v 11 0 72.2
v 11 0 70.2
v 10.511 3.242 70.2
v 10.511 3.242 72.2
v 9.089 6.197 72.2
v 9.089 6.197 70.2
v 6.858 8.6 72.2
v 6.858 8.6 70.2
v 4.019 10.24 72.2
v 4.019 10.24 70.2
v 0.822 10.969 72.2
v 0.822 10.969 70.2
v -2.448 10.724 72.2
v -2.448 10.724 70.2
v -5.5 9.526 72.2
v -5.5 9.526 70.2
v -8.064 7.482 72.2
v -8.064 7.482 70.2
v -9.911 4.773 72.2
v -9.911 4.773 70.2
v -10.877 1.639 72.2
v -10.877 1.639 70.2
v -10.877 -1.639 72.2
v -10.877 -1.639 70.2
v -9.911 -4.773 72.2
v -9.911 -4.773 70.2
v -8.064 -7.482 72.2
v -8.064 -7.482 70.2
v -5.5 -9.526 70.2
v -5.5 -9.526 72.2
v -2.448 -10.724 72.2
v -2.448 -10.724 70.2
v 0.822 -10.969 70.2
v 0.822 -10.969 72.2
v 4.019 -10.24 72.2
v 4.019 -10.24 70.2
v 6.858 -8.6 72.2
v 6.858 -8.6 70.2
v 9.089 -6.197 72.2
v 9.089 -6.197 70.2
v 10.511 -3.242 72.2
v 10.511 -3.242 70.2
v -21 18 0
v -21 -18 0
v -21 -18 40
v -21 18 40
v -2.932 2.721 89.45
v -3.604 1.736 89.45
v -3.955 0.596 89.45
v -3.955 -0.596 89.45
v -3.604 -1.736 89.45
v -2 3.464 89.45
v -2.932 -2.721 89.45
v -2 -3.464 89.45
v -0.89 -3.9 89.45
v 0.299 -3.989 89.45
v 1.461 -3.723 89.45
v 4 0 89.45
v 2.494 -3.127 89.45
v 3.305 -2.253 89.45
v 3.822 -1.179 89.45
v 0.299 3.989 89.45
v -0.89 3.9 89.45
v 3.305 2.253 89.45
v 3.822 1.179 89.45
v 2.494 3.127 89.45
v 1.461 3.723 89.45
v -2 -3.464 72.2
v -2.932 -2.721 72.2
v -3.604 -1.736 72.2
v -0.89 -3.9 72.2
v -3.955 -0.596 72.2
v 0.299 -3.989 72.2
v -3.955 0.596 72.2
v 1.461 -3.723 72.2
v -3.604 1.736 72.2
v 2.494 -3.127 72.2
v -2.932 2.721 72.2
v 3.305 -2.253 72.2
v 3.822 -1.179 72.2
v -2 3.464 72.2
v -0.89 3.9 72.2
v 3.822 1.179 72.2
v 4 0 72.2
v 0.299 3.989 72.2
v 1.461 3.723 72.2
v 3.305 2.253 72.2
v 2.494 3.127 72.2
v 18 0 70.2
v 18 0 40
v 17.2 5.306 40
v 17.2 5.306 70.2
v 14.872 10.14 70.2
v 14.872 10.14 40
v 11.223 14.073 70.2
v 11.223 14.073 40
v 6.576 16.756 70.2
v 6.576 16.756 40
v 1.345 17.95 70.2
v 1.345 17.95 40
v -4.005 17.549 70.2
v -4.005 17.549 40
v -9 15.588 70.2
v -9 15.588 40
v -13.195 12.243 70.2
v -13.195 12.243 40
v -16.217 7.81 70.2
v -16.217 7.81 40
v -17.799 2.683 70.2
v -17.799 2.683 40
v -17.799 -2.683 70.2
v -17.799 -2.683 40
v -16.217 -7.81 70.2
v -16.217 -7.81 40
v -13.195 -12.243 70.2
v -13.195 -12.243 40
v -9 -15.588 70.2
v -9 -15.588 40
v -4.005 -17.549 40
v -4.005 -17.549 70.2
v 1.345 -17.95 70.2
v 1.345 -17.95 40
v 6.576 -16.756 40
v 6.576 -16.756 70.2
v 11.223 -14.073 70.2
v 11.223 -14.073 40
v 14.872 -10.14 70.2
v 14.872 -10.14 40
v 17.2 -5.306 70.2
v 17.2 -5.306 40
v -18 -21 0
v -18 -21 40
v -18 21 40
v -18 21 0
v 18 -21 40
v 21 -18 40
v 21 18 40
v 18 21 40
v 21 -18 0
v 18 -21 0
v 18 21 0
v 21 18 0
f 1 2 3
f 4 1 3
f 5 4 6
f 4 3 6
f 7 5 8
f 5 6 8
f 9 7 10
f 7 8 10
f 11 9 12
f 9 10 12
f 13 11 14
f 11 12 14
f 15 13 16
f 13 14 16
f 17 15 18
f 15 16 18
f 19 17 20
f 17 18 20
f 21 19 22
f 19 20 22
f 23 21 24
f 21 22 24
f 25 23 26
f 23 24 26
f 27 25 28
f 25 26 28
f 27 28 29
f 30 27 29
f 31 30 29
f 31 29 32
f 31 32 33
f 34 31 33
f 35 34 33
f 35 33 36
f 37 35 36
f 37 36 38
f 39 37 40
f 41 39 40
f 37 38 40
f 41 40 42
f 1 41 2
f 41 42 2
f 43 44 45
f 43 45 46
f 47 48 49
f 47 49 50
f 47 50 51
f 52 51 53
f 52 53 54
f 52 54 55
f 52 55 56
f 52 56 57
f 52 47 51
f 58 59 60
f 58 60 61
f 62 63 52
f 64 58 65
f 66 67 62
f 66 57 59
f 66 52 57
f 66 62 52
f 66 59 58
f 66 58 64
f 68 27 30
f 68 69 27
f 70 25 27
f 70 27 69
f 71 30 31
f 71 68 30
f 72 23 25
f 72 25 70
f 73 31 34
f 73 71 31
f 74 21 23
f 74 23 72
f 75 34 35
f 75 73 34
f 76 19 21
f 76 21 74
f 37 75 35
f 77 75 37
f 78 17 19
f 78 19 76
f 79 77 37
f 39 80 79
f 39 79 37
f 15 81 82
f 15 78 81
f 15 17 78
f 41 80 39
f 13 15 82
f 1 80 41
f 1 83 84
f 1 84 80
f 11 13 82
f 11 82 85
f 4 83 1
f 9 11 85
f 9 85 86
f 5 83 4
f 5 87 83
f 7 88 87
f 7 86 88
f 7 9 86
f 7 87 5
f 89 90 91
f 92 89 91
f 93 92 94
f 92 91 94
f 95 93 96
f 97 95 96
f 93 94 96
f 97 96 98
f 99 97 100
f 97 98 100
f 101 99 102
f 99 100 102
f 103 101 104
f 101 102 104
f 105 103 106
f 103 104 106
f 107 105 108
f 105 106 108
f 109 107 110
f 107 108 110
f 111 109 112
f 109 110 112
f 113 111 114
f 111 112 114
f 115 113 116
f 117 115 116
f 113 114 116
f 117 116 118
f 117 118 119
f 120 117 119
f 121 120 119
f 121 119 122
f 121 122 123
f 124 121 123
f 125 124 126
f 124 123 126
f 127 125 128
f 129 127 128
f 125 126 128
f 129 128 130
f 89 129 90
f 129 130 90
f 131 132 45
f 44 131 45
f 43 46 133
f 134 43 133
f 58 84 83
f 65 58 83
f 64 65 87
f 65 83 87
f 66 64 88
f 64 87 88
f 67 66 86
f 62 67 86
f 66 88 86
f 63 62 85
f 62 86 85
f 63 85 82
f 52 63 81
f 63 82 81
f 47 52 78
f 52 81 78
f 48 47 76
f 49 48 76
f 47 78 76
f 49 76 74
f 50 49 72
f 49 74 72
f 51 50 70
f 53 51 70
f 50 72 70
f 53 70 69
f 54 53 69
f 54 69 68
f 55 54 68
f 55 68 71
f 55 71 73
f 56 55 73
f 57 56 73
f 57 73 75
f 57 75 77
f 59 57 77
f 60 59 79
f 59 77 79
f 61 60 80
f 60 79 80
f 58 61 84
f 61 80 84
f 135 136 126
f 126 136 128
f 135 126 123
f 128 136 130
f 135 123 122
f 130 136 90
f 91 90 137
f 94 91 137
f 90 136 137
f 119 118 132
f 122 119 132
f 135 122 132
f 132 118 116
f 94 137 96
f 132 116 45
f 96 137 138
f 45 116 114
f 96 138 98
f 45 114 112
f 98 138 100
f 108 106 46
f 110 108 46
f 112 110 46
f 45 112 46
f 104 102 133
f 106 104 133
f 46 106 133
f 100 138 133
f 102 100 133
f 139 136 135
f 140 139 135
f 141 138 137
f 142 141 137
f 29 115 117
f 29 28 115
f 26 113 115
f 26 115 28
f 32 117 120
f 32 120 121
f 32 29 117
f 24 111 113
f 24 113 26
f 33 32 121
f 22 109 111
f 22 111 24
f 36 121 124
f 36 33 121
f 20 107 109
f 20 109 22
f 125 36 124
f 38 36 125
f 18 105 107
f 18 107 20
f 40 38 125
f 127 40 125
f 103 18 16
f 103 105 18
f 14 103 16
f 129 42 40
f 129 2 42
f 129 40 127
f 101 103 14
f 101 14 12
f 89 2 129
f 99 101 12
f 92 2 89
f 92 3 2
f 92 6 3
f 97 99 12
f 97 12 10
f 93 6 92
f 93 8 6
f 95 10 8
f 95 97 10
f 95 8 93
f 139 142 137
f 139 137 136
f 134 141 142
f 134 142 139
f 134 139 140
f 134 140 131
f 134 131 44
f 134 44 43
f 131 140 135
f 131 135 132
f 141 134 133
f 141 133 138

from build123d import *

# Parameters (mm, degrees)
BOSS_EXTRUDE1_DEPTH = 40
SKETCH2_R           = 18
BOSS_EXTRUDE2_DEPTH = 30.2
SKETCH3_R           = 11
BOSS_EXTRUDE3_DEPTH = 2
SKETCH4_R           = 4
BOSS_EXTRUDE4_DEPTH = 17.25


with BuildPart() as part:
    # Sketch1 → Boss-Extrude1 (new body)
    with BuildSketch(Plane.XY):
        Polygon((-21, 18), (-18, 21), (18, 21), (21, 18), (21, -18), (18, -21), (-18, -21), (-21, -18), align=None)
    extrude(amount=BOSS_EXTRUDE1_DEPTH)

    # Sketch2 → Boss-Extrude2 (add)
    with BuildSketch(Plane.XY.offset(40)):
        Circle(SKETCH2_R)
    extrude(amount=BOSS_EXTRUDE2_DEPTH)

    # Sketch3 → Boss-Extrude3 (add)
    with BuildSketch(Plane.XY.offset(70.2)):
        Circle(SKETCH3_R)
    extrude(amount=BOSS_EXTRUDE3_DEPTH)

    # Sketch4 → Boss-Extrude4 (add)
    with BuildSketch(Plane.XY.offset(72.2)):
        Circle(SKETCH4_R)
    extrude(amount=BOSS_EXTRUDE4_DEPTH)


solid = part.part
